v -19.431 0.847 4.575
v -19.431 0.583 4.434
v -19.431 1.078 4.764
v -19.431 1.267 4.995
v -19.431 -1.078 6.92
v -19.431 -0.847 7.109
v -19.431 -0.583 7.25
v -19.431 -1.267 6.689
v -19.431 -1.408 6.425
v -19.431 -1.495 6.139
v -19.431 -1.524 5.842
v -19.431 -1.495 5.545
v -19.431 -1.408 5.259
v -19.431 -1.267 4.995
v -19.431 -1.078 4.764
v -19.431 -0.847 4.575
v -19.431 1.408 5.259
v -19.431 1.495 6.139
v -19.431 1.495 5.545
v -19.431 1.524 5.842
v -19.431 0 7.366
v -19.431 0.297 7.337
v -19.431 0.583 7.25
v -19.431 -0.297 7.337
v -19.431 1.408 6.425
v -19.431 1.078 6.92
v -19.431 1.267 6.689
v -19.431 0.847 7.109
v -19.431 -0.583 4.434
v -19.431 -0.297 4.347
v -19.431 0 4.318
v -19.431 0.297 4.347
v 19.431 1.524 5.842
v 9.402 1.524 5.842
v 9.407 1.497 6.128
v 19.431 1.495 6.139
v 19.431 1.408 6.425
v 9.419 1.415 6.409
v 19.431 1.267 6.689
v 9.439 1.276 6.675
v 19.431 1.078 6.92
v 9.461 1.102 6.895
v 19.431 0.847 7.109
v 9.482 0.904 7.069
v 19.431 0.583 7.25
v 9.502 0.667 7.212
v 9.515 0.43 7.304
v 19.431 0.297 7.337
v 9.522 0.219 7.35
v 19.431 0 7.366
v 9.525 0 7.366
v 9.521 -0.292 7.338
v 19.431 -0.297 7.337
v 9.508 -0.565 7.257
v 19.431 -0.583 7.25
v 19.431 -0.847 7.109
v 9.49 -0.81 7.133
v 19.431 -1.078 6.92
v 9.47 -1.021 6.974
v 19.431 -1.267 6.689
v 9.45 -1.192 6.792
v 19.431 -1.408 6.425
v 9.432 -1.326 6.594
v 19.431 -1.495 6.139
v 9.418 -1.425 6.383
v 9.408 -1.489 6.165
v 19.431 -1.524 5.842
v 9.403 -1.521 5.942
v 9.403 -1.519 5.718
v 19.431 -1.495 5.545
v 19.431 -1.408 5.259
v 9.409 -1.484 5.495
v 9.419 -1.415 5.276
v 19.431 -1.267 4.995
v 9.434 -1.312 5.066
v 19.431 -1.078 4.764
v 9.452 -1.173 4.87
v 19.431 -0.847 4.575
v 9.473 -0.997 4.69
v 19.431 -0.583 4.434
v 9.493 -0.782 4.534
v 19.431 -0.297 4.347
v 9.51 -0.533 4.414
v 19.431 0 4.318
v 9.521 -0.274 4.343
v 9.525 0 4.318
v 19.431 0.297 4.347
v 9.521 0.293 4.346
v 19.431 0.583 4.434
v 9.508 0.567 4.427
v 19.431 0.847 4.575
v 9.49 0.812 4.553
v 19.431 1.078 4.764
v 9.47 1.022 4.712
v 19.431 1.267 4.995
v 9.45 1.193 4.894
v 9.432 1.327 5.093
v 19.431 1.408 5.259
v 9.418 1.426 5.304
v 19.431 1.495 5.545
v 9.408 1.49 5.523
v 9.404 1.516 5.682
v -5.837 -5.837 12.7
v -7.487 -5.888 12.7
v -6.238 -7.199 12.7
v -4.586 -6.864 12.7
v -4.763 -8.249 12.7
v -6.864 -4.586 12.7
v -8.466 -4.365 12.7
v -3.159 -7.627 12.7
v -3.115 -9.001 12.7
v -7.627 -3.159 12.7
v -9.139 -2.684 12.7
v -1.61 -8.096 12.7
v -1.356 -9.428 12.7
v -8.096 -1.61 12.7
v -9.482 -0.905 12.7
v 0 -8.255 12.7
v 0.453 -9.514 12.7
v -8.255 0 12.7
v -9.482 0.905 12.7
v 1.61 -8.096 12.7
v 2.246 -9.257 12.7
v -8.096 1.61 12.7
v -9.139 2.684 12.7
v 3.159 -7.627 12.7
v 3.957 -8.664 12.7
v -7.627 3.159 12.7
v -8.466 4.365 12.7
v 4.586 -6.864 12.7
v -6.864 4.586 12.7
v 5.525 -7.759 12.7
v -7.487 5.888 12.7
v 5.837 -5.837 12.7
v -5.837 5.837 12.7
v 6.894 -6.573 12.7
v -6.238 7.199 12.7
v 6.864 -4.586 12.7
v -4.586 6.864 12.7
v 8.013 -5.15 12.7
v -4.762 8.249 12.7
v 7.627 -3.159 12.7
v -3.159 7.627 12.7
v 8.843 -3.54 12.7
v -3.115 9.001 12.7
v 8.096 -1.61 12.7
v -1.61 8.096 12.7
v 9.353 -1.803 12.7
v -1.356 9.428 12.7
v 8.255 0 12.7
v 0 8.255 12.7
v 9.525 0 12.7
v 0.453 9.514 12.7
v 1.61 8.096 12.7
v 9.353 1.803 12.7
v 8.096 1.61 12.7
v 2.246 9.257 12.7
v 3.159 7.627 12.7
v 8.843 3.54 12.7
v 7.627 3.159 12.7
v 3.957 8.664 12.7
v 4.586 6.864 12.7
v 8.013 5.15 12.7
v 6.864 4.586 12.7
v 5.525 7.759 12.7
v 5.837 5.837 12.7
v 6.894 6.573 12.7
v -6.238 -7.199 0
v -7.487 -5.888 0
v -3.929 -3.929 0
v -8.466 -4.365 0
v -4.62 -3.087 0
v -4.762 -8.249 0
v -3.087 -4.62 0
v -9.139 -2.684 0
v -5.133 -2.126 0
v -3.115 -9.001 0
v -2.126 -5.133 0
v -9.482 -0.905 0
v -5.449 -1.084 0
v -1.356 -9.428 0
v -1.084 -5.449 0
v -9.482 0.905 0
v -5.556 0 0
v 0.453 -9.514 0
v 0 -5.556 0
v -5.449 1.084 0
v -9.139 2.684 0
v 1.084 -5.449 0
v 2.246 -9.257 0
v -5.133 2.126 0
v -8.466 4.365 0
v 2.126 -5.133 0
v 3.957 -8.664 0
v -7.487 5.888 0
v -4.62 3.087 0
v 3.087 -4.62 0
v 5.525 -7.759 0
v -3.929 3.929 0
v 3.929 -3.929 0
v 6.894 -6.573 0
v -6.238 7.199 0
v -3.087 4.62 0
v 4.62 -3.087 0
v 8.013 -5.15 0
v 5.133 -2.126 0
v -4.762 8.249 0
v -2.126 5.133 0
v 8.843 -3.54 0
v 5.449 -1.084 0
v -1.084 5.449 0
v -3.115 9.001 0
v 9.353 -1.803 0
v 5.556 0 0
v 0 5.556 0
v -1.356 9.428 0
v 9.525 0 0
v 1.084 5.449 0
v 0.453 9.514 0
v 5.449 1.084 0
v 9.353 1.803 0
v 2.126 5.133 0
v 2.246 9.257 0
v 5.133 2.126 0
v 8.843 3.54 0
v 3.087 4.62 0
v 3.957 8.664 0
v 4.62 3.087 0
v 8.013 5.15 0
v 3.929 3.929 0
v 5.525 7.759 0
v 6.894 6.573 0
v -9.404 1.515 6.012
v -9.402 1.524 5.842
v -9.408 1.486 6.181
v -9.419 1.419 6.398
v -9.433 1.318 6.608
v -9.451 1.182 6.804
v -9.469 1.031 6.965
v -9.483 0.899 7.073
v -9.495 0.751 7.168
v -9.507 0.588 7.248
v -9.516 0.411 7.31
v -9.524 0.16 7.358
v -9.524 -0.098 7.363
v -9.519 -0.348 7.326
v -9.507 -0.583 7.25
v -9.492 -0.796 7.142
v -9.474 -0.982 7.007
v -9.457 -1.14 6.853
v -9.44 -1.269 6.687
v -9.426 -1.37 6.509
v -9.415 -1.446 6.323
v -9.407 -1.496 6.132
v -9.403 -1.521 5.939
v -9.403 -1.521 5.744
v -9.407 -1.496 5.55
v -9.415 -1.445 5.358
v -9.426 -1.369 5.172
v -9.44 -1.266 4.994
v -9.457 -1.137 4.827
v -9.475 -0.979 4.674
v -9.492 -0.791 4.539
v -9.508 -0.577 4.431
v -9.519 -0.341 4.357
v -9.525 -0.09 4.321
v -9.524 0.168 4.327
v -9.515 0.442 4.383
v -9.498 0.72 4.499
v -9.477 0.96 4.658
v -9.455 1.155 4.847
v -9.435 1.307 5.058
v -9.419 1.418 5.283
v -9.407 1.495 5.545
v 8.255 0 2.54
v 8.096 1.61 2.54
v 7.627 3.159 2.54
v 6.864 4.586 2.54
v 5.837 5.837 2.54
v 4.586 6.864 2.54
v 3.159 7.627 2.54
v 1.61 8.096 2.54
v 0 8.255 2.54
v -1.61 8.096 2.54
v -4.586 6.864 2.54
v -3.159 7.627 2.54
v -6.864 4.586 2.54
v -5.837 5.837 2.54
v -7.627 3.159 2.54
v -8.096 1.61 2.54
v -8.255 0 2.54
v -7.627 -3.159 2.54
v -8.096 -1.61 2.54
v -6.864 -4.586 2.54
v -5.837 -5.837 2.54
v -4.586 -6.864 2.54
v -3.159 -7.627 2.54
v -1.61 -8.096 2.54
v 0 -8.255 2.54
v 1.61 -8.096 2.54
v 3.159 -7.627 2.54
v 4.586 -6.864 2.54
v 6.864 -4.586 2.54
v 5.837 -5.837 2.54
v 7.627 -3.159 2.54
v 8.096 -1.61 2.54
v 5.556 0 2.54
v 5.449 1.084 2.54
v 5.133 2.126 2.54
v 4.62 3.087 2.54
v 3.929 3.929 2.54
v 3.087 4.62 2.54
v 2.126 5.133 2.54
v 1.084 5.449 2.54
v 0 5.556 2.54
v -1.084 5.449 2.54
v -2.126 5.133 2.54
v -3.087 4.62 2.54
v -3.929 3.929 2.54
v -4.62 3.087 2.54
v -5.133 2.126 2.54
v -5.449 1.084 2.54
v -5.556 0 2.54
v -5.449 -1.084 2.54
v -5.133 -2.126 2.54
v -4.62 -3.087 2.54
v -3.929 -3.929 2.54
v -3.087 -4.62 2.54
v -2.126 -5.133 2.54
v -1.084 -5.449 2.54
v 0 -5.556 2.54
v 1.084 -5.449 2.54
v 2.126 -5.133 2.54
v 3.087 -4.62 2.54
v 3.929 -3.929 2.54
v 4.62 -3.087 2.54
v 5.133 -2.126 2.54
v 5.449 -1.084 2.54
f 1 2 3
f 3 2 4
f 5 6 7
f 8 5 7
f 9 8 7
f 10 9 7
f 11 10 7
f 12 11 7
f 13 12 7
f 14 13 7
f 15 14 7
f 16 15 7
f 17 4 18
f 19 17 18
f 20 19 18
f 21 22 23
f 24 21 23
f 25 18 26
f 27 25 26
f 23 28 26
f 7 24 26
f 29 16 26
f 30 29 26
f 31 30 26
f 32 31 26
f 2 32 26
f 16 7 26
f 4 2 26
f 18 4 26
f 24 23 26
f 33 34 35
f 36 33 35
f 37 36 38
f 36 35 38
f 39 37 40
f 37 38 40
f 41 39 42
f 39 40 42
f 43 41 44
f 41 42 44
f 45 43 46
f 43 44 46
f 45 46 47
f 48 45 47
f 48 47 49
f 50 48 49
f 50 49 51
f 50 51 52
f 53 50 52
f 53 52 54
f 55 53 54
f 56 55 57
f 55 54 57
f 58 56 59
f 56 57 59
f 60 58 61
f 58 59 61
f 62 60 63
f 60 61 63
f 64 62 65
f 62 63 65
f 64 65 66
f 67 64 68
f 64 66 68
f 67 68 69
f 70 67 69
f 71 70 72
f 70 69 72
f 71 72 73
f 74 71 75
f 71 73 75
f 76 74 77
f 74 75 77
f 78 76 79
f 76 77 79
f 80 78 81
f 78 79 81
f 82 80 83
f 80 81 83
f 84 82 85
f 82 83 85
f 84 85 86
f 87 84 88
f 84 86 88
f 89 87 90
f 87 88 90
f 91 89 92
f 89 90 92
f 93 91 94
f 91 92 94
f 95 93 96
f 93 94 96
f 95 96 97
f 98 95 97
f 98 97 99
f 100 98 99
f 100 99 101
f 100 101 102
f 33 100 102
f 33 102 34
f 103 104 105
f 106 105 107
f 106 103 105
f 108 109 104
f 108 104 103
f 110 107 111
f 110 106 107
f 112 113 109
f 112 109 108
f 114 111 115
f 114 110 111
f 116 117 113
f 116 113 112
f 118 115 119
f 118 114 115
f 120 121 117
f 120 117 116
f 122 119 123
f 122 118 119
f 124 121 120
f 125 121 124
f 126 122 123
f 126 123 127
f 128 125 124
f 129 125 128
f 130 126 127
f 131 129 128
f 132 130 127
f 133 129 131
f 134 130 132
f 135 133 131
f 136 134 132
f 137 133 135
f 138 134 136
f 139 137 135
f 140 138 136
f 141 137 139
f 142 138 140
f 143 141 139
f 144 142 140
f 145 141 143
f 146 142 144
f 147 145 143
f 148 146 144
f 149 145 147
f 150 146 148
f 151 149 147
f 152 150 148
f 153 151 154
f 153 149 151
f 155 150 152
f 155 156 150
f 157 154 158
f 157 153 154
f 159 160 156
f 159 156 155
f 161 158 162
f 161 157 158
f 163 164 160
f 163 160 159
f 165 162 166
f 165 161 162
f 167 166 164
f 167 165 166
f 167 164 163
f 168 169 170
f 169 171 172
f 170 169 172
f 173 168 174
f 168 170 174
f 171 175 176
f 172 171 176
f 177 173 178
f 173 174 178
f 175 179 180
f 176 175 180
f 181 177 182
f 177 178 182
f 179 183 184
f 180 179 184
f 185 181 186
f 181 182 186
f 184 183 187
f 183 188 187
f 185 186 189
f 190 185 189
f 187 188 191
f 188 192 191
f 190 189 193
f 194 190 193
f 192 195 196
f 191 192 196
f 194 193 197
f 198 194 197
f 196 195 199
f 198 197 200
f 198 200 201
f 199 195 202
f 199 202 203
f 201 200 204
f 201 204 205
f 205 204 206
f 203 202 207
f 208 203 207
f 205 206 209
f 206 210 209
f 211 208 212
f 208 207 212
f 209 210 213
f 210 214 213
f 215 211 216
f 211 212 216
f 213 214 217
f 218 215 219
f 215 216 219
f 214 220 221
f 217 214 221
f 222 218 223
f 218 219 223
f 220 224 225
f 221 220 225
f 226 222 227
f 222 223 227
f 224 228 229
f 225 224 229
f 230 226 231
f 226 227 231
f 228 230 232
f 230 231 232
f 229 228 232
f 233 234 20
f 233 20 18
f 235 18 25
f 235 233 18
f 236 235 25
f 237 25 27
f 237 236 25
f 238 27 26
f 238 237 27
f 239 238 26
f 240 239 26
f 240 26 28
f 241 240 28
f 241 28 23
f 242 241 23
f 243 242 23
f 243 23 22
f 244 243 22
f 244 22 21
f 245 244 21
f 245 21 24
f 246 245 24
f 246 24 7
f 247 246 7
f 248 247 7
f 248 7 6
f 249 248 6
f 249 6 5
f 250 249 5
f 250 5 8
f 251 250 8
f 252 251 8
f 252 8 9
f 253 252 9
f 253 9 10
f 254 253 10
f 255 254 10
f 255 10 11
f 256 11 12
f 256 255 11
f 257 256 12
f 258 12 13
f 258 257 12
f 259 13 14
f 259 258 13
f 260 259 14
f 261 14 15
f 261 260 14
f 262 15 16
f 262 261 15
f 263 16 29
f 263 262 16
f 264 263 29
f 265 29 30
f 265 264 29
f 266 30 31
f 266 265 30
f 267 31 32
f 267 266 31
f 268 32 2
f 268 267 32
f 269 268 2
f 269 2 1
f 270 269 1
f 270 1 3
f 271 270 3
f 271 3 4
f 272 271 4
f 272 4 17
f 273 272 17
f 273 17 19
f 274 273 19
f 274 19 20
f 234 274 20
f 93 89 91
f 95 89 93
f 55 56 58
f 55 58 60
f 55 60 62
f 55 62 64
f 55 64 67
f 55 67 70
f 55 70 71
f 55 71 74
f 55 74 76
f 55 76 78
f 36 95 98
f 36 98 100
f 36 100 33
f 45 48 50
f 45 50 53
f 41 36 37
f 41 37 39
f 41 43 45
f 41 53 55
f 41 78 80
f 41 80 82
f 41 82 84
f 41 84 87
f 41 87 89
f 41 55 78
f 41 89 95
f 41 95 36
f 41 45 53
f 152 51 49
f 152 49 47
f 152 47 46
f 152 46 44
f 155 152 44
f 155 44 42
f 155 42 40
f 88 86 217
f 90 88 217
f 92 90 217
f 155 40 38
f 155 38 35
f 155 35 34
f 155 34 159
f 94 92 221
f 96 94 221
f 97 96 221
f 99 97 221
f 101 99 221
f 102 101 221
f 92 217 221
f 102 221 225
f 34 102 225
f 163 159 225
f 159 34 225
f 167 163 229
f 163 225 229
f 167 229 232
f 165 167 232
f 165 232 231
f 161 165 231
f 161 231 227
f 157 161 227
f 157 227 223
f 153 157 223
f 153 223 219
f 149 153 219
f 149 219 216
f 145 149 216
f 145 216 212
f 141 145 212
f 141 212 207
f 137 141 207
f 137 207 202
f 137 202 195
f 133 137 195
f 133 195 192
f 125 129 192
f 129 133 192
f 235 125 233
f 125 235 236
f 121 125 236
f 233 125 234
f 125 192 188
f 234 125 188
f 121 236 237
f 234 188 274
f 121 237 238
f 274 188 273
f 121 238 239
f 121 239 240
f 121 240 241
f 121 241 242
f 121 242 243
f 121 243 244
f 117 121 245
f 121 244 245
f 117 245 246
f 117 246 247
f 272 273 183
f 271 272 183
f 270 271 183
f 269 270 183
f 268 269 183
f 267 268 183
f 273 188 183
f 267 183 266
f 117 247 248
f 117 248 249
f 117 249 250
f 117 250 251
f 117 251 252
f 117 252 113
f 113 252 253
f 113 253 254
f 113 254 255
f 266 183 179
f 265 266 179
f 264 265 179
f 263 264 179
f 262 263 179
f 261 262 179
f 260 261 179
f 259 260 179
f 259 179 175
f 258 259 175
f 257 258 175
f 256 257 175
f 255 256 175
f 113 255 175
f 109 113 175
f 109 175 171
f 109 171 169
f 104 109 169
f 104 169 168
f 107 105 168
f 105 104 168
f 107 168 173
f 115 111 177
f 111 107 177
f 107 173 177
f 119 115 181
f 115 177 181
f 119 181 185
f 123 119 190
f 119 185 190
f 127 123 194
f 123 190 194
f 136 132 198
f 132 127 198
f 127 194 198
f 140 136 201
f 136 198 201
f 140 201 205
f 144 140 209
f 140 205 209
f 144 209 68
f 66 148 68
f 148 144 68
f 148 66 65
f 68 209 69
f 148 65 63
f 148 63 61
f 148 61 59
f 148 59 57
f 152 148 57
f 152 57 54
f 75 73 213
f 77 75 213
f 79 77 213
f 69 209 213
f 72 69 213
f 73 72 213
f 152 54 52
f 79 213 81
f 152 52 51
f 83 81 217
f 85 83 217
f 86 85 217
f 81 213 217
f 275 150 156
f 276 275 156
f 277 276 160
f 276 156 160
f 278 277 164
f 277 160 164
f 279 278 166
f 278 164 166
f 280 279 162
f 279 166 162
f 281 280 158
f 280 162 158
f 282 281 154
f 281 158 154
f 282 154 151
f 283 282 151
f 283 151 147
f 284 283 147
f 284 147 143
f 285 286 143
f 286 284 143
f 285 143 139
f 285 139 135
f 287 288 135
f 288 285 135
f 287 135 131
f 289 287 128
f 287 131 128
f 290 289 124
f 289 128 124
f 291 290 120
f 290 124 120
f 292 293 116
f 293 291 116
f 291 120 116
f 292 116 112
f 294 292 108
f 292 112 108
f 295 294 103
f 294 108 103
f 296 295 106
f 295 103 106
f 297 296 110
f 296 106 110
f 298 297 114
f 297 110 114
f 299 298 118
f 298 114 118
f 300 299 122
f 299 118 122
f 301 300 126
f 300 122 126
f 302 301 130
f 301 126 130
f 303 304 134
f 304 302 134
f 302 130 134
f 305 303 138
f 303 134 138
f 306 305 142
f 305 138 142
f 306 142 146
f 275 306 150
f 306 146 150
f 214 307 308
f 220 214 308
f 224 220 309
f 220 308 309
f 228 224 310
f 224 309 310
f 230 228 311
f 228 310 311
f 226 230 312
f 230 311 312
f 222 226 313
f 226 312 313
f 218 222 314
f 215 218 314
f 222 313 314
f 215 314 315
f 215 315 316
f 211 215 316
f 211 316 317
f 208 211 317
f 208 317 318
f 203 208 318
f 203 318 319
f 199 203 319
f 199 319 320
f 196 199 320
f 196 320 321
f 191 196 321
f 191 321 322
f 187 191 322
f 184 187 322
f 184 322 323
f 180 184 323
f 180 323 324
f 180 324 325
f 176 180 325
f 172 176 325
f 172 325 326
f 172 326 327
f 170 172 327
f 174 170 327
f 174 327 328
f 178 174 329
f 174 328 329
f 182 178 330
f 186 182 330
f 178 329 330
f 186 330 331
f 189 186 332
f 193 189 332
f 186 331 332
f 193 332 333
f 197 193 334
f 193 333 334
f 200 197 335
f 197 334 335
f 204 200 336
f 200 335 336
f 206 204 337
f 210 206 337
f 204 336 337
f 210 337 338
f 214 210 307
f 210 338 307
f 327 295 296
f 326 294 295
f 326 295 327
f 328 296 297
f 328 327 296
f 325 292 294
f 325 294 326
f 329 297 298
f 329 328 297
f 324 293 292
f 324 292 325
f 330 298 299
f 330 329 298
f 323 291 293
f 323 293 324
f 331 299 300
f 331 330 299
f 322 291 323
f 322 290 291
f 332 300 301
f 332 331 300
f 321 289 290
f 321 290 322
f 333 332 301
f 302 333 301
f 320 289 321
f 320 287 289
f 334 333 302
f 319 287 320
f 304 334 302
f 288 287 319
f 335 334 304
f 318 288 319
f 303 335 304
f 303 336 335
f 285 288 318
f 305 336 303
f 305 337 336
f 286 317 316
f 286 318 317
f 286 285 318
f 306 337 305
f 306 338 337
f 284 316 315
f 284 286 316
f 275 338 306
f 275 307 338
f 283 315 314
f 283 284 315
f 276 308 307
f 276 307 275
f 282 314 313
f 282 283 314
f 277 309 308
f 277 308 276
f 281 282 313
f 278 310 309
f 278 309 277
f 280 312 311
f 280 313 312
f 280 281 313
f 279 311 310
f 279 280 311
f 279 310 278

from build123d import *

# Parameters (mm, degrees)
F0_R     = 9.525
F1_DEPTH = 12.7
F2_R     = 8.255
F3_DEPTH = 10.16
F4_R     = 5.55625
F5_DEPTH = 25.4
F7_R     = 1.524
F8_DEPTH = 10.16


with BuildPart() as f1:
    # F0 (on Top) → F1 (new body)
    with BuildSketch(Plane.XY):
        Circle(F0_R)
    extrude(amount=F1_DEPTH)

    # F2 (on face) → F3 (cut)
    with BuildSketch(Plane.XY.offset(12.7)):
        Circle(F2_R)
    extrude(amount=-F3_DEPTH, mode=Mode.SUBTRACT)

    # F4 (on face) → F5 (cut)
    with BuildSketch(Plane.XY.offset(2.54)):
        Circle(F4_R)
    extrude(amount=-F5_DEPTH, mode=Mode.SUBTRACT)

    # F7 (on offset) → F8 (join)
    with BuildSketch(Plane.YZ.offset(9.271)):
        with Locations((0, 5.842)):
            Circle(F7_R)
    extrude(amount=F8_DEPTH)

    # F9: F1 across plane


with BuildPart() as f1_1:
    add(f1.part)
    add(f1.part.mirror(Plane.YZ))


solid = f1_1.part
